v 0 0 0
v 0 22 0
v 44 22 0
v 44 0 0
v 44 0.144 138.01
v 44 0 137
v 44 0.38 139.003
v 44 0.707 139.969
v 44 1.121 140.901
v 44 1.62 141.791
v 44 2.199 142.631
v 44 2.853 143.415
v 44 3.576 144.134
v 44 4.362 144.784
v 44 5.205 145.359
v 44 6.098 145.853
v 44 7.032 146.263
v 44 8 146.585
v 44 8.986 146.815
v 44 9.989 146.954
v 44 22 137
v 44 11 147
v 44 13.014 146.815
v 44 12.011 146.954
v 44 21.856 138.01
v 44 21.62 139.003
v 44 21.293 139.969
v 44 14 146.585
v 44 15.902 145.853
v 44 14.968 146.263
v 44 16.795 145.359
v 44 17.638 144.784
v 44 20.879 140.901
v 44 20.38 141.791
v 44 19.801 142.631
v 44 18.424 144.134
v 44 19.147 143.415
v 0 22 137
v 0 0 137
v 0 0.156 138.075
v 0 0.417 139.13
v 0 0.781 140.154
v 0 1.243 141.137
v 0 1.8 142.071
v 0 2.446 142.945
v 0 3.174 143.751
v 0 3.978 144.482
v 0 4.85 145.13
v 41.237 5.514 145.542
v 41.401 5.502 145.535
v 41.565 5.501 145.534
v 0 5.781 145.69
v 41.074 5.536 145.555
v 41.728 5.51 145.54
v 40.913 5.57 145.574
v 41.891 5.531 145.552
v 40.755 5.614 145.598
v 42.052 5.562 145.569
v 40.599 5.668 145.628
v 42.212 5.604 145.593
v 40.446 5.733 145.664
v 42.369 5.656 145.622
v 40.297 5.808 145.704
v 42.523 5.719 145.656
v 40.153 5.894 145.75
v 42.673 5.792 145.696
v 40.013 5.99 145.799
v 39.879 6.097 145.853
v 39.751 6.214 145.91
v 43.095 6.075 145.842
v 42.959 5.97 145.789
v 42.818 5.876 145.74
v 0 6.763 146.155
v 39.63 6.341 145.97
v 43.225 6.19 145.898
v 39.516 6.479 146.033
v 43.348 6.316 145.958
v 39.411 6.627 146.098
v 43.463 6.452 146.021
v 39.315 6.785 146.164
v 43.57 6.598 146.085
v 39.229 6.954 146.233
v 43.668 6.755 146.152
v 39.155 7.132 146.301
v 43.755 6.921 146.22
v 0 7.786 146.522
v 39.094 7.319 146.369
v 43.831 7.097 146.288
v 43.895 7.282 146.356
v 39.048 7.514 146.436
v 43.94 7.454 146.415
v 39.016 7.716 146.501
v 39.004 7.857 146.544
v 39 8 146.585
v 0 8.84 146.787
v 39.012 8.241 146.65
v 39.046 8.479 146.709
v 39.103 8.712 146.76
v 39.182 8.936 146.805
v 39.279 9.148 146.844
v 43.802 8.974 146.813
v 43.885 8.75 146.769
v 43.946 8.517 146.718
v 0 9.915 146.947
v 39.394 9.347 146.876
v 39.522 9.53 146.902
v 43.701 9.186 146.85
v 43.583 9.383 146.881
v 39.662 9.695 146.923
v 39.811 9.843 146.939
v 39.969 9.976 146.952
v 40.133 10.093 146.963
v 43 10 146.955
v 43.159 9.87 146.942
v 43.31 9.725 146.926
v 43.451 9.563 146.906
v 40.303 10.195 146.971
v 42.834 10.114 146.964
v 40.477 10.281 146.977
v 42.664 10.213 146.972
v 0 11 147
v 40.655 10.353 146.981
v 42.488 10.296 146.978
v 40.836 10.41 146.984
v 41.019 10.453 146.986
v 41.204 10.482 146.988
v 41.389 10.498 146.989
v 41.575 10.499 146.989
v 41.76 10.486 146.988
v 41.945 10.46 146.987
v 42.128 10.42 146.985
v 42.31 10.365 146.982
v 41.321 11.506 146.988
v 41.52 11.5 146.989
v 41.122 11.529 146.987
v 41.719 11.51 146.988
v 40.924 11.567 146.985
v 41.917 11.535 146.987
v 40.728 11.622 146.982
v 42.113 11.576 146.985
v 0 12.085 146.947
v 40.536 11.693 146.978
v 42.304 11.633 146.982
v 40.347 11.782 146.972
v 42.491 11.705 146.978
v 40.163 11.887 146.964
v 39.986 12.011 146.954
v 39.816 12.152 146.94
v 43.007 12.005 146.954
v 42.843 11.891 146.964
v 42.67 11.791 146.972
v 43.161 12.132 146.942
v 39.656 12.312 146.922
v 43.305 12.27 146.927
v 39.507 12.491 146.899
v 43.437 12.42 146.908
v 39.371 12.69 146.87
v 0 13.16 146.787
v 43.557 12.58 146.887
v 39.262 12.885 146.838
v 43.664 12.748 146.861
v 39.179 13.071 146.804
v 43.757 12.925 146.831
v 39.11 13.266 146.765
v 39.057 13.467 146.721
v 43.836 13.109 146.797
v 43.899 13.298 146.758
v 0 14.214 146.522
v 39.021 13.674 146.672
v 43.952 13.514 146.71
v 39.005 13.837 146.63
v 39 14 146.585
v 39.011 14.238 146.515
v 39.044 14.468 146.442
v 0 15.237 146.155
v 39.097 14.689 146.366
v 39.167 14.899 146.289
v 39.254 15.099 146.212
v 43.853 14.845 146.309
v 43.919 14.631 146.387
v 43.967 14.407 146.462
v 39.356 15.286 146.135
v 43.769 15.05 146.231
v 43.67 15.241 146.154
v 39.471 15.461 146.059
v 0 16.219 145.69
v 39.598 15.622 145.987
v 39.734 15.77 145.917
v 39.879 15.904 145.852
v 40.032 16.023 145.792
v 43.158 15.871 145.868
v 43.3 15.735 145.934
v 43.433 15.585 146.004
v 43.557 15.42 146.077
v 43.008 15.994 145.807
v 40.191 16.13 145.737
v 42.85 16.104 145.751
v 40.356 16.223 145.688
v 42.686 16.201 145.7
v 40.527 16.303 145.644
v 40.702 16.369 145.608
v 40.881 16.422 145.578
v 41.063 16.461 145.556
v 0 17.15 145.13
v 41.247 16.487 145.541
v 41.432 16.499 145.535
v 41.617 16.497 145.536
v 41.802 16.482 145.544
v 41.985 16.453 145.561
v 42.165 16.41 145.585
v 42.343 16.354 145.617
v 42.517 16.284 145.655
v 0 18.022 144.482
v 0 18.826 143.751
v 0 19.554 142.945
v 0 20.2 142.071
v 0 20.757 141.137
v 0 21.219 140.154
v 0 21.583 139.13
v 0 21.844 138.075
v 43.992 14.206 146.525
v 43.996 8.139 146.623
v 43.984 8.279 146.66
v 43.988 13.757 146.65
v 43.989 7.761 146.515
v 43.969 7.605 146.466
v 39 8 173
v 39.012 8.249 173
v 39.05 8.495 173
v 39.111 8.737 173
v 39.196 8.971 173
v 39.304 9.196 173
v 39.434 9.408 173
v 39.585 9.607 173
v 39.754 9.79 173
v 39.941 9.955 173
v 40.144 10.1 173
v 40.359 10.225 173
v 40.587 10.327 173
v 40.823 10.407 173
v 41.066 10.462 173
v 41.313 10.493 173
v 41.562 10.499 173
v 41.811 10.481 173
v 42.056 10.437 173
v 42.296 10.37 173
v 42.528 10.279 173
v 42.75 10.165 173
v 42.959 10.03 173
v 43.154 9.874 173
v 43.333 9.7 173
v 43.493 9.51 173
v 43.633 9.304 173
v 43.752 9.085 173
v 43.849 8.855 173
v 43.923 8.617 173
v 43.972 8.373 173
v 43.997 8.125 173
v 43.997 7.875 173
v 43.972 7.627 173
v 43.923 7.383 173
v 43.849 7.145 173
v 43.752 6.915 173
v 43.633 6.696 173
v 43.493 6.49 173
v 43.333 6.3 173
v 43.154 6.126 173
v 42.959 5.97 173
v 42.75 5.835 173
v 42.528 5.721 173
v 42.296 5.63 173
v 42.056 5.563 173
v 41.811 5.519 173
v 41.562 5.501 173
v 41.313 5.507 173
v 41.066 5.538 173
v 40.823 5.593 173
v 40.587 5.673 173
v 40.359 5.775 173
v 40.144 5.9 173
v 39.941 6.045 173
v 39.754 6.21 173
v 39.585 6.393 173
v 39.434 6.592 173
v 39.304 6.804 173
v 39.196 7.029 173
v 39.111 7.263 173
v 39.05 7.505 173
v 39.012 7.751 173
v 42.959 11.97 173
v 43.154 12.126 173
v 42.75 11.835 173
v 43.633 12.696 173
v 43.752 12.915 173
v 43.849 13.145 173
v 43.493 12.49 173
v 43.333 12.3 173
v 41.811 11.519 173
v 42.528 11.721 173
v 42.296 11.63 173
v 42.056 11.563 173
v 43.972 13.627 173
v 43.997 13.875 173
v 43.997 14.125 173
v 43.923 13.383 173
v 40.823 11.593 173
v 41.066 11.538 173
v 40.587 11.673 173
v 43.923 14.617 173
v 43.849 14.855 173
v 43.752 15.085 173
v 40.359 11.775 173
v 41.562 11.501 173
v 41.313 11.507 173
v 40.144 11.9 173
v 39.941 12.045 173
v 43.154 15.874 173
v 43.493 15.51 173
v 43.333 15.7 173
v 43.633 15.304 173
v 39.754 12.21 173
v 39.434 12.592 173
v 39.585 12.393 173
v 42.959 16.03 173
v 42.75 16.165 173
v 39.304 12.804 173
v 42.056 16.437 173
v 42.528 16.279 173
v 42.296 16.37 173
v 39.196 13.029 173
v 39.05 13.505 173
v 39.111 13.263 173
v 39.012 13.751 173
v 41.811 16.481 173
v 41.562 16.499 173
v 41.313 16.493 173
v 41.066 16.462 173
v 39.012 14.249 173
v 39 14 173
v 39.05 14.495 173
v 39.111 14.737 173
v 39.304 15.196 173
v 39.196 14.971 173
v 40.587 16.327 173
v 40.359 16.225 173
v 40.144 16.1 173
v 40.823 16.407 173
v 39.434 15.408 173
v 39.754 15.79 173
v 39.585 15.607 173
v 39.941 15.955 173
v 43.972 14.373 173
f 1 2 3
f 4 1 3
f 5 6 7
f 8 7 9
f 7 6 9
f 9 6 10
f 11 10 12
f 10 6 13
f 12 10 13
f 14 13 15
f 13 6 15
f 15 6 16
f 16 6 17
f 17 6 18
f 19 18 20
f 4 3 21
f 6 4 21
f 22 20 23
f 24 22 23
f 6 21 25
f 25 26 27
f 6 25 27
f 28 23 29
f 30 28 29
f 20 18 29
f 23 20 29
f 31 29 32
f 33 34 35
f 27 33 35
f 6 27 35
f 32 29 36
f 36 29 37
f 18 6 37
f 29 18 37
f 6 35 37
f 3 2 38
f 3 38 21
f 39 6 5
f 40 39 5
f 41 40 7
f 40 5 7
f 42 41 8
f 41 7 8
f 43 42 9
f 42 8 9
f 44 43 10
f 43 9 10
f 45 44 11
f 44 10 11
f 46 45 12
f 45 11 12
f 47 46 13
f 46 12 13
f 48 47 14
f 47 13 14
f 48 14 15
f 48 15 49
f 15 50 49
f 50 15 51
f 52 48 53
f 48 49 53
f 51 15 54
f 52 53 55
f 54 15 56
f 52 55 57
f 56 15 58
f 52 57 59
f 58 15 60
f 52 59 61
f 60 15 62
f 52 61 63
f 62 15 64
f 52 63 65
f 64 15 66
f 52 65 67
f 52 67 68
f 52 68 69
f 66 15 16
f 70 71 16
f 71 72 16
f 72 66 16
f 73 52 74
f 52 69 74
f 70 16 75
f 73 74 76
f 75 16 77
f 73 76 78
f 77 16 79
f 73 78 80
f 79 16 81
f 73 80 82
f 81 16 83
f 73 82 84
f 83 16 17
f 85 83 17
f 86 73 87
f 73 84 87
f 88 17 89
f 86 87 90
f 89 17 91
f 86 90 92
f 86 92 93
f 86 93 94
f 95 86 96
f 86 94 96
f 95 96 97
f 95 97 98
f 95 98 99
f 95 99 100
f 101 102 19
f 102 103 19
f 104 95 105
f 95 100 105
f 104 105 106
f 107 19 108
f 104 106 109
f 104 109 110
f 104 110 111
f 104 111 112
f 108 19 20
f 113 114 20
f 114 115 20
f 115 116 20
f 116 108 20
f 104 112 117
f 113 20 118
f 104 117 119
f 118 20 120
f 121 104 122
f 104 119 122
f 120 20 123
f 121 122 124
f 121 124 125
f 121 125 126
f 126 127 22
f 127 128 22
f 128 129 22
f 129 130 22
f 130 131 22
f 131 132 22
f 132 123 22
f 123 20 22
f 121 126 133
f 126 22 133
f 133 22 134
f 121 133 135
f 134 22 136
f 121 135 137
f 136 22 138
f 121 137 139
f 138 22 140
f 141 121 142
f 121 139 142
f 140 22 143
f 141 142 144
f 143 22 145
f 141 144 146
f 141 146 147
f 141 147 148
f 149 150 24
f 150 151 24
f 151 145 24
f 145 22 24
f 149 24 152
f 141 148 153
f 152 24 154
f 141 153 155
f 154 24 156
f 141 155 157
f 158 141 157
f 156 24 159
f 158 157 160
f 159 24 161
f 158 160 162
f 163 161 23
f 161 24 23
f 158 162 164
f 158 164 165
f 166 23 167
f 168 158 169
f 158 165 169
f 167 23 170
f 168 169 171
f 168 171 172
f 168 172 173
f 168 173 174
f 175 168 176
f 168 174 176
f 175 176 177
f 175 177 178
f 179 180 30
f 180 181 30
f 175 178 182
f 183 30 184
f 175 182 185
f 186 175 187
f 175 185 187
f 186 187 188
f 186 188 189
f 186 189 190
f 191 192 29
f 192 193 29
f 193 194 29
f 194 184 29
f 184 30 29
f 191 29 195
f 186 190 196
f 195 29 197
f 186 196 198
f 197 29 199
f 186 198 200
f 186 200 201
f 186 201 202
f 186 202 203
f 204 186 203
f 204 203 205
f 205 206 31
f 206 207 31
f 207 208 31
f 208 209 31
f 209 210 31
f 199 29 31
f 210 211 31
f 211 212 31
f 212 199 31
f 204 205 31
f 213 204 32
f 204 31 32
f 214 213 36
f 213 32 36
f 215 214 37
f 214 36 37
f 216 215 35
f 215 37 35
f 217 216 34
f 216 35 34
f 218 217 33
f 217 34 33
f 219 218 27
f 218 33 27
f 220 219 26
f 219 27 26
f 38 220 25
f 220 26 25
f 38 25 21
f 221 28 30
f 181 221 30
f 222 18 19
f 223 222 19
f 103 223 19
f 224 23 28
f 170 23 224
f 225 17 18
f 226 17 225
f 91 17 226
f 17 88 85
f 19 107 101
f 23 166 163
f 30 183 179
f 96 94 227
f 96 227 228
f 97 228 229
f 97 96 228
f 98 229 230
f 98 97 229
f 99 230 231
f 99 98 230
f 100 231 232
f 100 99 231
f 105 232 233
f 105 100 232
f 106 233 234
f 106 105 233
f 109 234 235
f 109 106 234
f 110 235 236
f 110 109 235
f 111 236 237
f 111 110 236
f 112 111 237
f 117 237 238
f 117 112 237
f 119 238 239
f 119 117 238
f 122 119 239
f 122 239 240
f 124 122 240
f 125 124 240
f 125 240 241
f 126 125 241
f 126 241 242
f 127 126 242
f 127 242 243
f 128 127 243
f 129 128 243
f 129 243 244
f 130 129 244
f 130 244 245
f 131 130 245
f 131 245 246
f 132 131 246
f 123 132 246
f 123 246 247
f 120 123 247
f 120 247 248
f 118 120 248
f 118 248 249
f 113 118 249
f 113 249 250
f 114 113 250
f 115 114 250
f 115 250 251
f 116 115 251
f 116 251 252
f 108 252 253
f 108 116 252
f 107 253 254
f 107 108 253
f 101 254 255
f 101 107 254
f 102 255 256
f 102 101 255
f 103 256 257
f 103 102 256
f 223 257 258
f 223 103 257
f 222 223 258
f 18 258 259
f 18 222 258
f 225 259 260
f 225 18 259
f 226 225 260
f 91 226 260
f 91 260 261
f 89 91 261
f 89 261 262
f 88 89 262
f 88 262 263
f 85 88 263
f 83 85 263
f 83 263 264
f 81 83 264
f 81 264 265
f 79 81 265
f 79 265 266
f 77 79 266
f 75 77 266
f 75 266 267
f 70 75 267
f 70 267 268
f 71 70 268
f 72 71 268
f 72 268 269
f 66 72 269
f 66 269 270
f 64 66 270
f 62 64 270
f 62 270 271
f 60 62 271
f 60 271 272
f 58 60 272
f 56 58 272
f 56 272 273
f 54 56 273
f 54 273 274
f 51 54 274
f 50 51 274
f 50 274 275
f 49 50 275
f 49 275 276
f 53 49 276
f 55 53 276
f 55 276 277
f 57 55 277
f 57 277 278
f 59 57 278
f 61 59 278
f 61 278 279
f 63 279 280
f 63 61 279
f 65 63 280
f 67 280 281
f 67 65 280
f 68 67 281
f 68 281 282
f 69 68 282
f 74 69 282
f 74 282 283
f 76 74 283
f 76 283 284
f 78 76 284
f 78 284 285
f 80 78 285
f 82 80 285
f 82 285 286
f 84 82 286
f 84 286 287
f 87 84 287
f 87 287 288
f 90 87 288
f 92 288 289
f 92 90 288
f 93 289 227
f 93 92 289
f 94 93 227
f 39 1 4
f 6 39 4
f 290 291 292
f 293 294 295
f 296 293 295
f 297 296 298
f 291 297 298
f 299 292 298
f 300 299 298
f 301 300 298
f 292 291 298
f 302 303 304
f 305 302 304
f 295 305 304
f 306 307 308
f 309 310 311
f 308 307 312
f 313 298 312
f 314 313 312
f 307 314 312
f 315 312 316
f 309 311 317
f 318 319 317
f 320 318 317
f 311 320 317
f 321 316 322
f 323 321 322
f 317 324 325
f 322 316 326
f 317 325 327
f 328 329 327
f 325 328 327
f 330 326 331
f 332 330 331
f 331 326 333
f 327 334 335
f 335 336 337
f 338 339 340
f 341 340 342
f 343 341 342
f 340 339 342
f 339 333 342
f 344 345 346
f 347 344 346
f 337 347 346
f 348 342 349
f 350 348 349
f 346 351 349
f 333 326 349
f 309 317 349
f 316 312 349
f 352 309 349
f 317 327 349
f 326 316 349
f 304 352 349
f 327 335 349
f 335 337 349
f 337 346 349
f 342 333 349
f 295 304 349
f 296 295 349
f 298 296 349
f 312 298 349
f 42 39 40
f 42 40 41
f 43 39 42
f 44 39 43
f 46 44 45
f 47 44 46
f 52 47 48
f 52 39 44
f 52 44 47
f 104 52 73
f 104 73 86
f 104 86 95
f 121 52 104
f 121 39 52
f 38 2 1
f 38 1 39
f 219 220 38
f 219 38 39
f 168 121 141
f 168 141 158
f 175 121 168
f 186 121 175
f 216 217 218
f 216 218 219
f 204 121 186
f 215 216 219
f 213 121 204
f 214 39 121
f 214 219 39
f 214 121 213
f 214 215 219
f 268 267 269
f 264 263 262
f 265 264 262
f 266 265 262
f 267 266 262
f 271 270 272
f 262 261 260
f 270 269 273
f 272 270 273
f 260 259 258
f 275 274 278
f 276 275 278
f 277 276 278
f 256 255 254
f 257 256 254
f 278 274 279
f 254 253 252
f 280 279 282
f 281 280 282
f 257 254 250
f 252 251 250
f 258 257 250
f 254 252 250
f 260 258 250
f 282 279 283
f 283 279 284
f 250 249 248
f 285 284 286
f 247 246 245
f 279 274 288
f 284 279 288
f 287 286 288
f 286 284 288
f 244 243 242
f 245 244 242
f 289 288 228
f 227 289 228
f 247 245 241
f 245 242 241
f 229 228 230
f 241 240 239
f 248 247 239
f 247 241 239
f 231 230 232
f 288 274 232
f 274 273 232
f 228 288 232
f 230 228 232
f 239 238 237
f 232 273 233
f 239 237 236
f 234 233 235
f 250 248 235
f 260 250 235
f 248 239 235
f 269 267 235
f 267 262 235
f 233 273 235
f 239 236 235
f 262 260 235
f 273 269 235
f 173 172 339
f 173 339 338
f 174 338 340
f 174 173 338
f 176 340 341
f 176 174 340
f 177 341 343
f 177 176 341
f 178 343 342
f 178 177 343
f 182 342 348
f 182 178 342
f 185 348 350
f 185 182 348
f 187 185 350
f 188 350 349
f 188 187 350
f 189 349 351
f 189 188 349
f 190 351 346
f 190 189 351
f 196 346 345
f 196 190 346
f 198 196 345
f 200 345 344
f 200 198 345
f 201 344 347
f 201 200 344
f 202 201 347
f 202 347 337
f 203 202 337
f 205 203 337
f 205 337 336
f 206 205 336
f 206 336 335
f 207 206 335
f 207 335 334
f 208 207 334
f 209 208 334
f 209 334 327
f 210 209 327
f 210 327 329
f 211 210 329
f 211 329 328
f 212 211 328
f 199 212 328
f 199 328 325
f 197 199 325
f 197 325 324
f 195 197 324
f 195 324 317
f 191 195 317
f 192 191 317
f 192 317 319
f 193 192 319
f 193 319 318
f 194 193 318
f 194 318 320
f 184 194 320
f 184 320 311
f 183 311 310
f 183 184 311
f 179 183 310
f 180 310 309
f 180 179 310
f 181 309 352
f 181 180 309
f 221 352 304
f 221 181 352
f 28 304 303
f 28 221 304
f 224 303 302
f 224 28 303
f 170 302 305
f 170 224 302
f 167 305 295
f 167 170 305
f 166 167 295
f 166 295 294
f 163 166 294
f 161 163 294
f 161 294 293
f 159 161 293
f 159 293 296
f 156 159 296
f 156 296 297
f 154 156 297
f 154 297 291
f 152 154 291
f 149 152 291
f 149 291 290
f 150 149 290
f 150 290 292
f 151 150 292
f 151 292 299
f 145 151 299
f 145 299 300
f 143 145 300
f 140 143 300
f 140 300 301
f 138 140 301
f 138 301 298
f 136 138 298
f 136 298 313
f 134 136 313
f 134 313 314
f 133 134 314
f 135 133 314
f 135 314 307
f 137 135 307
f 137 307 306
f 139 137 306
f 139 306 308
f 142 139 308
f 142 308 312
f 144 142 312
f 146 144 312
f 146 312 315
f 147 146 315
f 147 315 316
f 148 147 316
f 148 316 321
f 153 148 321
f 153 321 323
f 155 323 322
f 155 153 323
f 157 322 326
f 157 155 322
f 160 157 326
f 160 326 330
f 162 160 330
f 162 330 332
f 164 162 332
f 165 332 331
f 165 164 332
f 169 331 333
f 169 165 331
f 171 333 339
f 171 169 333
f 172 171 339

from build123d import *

# Parameters (mm, degrees)
ESQUISSE1_W        = 44
ESQUISSE1_H        = 22
BOSS_EXTRU_1_DEPTH = 137
BOSS_EXTRU_2_DEPTH = 44
ESQUISSE3_R        = 2.5
BOSS_EXTRU_3_DEPTH = 173


with BuildPart() as part:
    # Esquisse1 → Boss.-Extru.1 (new body)
    with BuildSketch(Plane.XY):
        with Locations((22, 11)):
            Rectangle(ESQUISSE1_W, ESQUISSE1_H)
    extrude(amount=BOSS_EXTRU_1_DEPTH)

    # Esquisse2 → Boss.-Extru.2 (add)
    with BuildSketch(Plane(origin=(44, 0, 0), x_dir=(0, 0, -1), z_dir=(1, 0, 0))):
        with BuildLine():
            Line((-137, 22), (-137, 0))
            ThreePointArc((-137, 0), (-147, 11), (-137, 22))
        make_face()
    extrude(amount=-BOSS_EXTRU_2_DEPTH)

    # Esquisse3 → Boss.-Extru.3 (add)
    with BuildSketch(Plane(origin=(0, 0, 0), x_dir=(-1, 0, 0), z_dir=(0, 0, -1))):
        with Locations((-41.5, 14)):
            Circle(ESQUISSE3_R)
        with Locations((-41.5, 8)):
            Circle(ESQUISSE3_R)
    extrude(amount=-BOSS_EXTRU_3_DEPTH)


solid = part.part
